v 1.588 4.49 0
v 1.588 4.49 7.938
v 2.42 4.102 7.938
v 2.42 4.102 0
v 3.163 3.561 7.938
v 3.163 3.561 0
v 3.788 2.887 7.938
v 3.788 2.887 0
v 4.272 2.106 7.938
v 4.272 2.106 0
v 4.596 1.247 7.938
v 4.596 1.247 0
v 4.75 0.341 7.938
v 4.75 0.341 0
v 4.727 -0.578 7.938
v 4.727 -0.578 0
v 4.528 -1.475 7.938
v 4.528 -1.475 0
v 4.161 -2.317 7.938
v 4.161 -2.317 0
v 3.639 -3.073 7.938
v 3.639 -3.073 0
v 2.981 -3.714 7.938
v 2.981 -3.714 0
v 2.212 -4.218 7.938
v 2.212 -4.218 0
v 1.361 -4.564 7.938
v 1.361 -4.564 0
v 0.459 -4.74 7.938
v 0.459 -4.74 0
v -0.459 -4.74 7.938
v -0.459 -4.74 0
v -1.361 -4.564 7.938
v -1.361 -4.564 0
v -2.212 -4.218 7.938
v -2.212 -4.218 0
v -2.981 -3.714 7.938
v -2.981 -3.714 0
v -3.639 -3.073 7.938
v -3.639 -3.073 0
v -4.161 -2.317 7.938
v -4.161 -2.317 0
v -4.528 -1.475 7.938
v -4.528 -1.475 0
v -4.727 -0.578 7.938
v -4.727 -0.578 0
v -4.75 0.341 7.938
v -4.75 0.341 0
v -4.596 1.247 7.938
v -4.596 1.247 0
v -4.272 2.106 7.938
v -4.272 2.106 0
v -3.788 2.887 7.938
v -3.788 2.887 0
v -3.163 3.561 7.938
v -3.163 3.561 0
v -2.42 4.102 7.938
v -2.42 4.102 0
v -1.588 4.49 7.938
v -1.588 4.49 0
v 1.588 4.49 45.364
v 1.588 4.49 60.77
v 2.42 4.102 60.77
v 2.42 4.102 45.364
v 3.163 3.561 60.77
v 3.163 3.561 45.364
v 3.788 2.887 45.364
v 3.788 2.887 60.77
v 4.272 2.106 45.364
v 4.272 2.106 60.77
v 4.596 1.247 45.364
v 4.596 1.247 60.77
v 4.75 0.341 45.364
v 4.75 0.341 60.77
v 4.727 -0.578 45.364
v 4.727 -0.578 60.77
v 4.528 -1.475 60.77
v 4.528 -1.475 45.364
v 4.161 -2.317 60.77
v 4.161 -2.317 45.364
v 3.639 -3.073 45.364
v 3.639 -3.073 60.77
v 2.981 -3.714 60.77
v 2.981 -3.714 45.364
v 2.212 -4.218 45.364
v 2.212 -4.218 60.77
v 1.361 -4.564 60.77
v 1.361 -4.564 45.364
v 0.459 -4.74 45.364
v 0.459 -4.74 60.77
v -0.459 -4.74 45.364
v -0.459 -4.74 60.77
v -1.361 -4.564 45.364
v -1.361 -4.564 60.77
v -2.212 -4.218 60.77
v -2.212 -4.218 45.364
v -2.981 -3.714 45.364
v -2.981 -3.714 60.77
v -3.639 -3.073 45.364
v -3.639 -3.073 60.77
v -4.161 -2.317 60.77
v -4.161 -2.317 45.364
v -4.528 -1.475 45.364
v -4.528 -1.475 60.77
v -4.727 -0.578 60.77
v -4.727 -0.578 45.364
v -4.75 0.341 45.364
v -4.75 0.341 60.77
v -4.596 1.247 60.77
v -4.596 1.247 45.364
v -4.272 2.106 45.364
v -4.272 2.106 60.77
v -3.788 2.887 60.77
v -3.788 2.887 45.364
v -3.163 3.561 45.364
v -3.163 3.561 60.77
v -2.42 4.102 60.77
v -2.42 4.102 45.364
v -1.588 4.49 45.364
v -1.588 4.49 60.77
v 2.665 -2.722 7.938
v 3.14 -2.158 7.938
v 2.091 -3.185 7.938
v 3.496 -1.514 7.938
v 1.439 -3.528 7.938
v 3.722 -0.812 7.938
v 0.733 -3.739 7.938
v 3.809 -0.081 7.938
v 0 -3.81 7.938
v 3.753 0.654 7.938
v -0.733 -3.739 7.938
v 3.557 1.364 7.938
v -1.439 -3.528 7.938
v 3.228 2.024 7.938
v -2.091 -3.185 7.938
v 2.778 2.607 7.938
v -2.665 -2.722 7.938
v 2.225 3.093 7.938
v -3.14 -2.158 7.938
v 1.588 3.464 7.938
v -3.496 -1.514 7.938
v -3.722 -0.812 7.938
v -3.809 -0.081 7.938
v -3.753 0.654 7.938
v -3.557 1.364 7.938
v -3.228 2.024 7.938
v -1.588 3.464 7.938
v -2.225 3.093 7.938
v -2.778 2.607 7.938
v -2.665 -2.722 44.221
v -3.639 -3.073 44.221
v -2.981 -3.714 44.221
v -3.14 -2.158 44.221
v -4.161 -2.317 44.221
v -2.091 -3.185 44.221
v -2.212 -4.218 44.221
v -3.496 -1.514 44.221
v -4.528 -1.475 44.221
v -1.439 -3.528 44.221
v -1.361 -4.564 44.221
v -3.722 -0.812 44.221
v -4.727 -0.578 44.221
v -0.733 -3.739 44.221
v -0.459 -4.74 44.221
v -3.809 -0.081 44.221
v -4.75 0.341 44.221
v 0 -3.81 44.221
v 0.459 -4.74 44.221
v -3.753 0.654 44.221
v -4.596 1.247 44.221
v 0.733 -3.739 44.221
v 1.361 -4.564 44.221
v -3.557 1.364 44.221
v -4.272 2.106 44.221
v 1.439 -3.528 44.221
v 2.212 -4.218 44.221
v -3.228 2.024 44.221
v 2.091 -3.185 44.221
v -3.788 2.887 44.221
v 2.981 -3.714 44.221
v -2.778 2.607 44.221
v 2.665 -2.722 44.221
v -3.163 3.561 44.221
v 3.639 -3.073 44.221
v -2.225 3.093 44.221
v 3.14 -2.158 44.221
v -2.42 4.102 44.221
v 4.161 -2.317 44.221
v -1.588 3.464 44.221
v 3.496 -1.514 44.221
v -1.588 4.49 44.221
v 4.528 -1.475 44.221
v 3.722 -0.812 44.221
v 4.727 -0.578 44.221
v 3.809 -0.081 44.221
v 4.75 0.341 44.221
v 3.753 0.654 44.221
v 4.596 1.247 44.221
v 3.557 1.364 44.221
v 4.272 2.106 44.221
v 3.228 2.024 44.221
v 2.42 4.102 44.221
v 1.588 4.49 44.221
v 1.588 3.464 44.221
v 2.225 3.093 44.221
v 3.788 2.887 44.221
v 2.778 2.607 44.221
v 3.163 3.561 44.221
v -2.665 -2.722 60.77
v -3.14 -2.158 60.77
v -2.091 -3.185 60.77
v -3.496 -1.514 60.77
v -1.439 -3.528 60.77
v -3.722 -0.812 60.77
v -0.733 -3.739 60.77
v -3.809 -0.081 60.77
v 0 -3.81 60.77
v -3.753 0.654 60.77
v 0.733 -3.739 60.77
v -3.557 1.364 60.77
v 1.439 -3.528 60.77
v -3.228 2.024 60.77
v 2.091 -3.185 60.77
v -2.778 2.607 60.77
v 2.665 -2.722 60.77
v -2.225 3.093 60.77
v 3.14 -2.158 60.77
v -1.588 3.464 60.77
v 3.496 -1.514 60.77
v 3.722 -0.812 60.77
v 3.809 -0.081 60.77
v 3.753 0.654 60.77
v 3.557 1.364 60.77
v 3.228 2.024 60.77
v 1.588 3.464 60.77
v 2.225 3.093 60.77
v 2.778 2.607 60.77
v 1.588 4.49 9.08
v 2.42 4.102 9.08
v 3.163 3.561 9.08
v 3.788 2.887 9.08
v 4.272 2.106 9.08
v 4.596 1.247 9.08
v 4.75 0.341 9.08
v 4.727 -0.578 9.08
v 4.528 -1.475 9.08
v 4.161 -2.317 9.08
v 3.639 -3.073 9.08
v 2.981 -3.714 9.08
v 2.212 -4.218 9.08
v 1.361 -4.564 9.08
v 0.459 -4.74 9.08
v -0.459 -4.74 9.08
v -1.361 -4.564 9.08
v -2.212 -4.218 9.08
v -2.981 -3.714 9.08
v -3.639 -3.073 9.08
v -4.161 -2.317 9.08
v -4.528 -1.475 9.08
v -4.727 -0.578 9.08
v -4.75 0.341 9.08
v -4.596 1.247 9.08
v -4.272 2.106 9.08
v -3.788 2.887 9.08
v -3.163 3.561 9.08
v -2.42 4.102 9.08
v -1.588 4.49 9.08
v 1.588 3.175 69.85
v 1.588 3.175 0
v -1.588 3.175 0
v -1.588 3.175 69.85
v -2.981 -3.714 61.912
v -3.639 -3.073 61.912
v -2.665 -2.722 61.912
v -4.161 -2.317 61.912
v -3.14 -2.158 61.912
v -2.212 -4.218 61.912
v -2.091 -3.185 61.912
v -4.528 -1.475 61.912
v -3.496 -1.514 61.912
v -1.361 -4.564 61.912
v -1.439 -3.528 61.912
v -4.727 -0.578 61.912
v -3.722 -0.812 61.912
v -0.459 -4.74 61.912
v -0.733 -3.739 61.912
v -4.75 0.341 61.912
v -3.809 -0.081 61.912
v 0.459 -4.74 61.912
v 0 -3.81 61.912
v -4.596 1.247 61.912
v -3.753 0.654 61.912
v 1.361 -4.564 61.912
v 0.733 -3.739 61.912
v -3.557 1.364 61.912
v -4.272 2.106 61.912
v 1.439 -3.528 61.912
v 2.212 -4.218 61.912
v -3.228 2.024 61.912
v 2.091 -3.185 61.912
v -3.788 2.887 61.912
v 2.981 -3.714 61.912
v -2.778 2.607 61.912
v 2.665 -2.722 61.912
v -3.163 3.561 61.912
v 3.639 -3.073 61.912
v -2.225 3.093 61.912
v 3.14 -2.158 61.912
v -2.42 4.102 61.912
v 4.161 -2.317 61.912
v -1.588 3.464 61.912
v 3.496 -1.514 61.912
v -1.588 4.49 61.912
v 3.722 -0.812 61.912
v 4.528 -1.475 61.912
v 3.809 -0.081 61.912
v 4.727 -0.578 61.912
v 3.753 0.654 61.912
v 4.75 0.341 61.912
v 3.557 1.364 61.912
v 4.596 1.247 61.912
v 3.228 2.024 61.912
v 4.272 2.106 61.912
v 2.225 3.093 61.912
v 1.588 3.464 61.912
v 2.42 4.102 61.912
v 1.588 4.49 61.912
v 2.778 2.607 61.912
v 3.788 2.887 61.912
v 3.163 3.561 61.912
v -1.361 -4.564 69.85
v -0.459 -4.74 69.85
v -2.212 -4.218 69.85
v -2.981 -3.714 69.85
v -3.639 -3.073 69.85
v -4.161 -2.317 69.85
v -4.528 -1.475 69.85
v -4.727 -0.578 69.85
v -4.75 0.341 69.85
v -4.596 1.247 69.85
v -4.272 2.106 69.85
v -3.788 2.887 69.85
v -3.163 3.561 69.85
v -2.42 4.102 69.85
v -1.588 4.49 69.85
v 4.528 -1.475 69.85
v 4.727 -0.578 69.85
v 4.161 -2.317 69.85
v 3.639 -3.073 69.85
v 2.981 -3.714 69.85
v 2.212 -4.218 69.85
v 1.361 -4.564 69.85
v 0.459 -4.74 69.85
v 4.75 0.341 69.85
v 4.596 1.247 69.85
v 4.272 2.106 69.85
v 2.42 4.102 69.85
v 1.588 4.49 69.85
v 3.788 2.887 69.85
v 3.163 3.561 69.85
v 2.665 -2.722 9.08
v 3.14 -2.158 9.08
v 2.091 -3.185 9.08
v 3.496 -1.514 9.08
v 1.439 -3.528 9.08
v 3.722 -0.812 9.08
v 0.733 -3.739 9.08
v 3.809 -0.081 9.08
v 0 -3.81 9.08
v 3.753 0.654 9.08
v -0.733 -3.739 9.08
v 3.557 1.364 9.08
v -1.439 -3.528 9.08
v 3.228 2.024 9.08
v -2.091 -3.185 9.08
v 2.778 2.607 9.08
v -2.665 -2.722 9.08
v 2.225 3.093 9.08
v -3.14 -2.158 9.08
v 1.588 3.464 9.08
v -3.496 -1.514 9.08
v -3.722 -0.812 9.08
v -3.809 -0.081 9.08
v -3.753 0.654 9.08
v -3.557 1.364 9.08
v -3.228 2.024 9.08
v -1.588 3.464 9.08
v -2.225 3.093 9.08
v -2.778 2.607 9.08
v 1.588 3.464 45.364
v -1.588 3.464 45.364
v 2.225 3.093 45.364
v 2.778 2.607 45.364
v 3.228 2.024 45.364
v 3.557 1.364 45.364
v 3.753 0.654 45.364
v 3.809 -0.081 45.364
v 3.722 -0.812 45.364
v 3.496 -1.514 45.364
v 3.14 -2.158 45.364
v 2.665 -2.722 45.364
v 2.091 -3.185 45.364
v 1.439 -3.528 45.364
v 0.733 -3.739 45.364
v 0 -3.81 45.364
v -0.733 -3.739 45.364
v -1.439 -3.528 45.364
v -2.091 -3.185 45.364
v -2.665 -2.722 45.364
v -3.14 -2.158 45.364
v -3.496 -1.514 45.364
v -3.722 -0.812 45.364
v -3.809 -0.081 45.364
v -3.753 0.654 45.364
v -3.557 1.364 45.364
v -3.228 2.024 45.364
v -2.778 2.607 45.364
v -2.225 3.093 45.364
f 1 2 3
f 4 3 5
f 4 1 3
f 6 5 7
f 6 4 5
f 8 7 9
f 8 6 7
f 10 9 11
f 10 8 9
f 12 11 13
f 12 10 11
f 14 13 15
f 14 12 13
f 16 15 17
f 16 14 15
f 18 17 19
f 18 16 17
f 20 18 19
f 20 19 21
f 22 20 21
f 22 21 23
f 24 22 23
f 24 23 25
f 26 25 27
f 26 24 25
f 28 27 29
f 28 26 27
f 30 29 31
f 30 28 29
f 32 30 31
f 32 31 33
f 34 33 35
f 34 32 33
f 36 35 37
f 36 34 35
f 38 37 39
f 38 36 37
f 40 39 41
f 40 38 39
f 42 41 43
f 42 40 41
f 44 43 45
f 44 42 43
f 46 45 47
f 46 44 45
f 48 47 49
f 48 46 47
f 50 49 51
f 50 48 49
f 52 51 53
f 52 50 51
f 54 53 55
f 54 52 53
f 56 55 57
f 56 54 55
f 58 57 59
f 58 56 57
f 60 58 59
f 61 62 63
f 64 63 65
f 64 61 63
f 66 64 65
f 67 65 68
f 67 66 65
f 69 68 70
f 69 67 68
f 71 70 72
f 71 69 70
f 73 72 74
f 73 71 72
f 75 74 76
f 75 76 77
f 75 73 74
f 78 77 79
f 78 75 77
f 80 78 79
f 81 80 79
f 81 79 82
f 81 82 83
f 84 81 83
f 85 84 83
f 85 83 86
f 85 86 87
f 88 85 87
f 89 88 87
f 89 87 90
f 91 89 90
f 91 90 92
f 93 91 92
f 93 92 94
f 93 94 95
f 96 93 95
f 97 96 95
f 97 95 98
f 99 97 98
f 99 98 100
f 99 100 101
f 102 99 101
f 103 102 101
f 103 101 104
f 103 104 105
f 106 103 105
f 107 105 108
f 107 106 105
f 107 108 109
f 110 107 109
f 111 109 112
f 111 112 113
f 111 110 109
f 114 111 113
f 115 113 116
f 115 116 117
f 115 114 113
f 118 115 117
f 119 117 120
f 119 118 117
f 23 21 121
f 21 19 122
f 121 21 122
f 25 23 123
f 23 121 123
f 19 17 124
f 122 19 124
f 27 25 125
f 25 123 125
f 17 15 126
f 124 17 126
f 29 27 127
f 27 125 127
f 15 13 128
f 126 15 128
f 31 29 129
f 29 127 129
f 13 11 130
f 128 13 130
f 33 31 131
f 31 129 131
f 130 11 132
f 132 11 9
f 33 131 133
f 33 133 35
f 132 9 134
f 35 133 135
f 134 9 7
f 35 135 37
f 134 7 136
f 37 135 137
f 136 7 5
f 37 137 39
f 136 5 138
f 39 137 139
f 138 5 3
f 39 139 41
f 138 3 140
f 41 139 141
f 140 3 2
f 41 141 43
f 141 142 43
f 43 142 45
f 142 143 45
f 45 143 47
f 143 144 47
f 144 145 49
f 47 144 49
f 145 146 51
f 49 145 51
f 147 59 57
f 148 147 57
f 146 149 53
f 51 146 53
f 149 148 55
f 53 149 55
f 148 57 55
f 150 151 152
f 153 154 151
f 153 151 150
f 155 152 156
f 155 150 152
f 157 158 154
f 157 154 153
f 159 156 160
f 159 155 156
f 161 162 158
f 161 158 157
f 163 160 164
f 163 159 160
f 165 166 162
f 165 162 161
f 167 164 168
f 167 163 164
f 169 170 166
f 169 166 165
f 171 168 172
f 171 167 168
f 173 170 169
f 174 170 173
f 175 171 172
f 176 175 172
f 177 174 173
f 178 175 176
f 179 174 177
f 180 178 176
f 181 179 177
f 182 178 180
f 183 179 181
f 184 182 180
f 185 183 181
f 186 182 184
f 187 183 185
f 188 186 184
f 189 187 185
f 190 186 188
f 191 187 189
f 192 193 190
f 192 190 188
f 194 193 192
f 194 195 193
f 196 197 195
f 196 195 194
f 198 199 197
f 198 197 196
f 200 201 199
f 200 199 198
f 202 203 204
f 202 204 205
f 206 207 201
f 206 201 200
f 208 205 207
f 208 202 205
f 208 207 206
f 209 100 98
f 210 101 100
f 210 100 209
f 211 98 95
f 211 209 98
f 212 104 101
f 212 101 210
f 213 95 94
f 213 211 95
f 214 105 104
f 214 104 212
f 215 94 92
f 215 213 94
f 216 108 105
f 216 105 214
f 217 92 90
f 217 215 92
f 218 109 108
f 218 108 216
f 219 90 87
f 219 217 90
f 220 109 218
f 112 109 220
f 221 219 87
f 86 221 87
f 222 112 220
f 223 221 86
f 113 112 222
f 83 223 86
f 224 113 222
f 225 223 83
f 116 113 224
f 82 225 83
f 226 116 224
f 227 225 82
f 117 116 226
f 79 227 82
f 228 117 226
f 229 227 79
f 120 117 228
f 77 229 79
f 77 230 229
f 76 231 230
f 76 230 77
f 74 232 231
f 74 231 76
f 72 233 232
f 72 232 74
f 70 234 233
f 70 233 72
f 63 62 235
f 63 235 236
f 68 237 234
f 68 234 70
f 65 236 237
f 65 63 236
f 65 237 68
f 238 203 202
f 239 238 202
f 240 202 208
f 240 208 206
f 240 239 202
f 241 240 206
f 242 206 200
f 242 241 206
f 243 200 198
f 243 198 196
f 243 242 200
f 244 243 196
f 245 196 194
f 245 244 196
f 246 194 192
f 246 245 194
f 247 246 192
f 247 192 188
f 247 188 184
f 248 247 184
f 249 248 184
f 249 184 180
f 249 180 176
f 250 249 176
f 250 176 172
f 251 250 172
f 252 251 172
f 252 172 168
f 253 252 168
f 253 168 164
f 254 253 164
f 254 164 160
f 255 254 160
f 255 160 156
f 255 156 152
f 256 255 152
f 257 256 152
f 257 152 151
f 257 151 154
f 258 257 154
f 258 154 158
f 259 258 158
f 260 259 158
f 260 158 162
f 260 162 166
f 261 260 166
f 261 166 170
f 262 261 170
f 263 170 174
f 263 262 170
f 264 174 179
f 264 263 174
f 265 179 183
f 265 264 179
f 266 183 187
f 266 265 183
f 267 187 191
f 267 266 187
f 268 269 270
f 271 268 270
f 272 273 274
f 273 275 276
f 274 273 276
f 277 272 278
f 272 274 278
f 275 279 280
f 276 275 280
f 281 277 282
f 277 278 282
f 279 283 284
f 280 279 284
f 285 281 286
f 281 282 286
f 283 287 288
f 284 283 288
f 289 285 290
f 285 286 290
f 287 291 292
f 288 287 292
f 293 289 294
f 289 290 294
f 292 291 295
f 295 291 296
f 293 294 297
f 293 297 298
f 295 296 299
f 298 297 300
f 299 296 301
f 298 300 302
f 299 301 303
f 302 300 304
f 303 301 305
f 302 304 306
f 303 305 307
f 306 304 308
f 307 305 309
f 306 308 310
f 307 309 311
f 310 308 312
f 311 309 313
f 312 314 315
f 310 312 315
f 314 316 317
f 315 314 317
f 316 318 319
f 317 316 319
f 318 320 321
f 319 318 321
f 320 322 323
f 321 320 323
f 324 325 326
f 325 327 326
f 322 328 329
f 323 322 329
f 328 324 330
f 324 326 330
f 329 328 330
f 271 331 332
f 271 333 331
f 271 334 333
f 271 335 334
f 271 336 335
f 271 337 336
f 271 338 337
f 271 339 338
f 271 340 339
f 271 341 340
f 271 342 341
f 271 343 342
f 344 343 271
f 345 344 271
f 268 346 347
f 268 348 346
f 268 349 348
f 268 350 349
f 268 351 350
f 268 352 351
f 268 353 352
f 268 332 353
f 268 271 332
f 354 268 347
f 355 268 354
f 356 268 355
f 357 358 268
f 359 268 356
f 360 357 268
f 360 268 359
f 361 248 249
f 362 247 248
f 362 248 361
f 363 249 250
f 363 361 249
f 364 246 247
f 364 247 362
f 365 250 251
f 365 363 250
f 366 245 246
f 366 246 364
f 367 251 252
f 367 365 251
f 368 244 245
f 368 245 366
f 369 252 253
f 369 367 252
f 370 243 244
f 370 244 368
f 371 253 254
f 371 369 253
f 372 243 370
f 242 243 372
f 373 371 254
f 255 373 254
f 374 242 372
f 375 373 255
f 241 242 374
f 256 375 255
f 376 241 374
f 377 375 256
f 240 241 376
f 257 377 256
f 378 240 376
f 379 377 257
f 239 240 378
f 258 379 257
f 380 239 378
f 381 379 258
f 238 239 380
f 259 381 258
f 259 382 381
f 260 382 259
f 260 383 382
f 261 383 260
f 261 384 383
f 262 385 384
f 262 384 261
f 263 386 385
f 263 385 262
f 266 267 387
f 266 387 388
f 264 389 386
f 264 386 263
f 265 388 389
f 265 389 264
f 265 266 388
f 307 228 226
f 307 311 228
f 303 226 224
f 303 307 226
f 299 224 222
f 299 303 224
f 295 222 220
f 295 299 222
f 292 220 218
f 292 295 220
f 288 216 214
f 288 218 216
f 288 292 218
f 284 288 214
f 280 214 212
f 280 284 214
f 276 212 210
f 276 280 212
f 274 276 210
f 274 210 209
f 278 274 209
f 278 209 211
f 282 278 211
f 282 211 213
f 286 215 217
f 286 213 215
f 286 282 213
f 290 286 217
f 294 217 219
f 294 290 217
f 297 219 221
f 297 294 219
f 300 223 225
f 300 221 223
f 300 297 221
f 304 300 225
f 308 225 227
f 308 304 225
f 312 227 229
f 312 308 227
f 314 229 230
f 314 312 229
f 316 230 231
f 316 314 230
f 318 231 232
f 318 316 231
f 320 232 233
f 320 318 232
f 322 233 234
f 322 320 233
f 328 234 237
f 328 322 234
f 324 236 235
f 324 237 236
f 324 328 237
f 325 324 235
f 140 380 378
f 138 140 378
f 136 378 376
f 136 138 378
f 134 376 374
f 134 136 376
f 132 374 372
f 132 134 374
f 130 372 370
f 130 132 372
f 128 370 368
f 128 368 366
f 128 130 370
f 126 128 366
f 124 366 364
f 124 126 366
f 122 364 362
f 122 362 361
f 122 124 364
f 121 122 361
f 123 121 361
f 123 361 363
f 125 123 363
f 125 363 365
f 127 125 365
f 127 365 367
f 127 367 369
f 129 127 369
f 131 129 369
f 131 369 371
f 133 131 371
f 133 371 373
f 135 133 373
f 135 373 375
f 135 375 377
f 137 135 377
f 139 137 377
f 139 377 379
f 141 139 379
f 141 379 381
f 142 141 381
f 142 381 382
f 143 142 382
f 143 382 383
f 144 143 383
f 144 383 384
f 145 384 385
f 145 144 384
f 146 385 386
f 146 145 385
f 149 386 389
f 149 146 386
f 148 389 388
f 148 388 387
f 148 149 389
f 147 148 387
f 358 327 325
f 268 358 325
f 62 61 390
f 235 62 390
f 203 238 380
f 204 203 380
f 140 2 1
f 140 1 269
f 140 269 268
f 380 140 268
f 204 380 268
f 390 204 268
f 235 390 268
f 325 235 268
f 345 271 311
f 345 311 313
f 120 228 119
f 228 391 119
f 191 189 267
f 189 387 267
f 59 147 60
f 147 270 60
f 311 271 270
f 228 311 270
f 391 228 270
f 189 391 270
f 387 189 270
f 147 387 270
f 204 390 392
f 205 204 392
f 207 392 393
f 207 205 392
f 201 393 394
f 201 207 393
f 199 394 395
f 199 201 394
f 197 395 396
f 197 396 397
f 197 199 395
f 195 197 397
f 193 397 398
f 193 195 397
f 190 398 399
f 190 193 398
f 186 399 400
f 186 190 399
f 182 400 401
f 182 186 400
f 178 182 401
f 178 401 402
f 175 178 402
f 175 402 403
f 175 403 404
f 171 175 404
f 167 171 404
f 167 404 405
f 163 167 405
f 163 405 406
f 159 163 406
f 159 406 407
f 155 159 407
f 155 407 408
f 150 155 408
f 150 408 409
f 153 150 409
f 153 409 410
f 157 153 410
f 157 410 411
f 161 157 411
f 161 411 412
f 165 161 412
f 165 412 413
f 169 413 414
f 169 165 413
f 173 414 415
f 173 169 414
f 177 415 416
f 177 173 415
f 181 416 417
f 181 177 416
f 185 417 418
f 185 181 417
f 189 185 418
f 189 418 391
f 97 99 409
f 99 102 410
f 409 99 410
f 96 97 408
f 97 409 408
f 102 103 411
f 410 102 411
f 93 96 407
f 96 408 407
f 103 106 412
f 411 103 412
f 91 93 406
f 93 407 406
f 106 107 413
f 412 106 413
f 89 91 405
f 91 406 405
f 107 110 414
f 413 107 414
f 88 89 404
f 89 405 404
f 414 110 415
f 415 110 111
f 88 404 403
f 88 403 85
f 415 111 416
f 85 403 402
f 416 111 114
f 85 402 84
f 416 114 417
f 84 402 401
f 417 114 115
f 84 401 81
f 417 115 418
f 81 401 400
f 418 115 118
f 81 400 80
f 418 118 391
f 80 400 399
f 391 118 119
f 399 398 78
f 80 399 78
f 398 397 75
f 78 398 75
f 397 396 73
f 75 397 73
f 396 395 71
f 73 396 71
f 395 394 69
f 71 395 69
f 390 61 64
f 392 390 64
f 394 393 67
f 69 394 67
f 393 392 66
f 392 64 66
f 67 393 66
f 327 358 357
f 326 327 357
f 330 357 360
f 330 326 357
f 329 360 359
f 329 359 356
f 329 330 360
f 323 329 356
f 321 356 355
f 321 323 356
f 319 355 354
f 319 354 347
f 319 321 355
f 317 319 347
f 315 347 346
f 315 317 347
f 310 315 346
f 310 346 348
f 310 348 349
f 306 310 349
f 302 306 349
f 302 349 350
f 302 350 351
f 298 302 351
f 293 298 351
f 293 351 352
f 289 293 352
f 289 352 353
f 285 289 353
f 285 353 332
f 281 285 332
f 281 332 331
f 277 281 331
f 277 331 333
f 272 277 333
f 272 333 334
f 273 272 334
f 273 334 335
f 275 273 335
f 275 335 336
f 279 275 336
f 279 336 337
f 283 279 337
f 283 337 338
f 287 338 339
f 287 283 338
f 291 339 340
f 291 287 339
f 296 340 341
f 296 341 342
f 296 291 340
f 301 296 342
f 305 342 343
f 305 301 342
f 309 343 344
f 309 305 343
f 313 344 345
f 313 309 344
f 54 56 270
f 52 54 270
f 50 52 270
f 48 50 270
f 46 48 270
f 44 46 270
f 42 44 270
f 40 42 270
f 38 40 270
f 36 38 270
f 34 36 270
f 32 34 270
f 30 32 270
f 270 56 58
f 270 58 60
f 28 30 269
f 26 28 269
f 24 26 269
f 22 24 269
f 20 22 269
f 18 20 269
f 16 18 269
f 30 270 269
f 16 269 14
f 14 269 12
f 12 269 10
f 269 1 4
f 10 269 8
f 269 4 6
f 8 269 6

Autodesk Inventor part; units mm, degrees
sketch "Sketch1" plane through (0, 0, 0) normal (0, 0, 1) x (1, 0, 0)
  circle A0 centre (0, 0) radius 4.7625
  line L0 (-1.5875, 6.35) -> (1.5875, 6.35)
  line L1 (1.5875, 6.35) -> (1.5875, 3.175)
  line L2 (1.5875, 3.175) -> (-1.5875, 3.175)
  line L3 (-1.5875, 3.175) -> (-1.5875, 6.35)
  dimension "d0" = 9.525
  dimension "d16" = 3.175
  dimension "d17" = 3.175
  dimension "d18" = 1.5875
  dimension "d19" = 6.35
extrude "Extrusion1" add sketch "Sketch1" along normal blind 69.85 contours A0 L3 L2 L1 | L1 L2 L3 A0
ref_plane "Work Plane1" through (0, 0, 61.9125) normal (0, 0, 1) x (1, 0, 0)
sketch "Sketch2" plane through (0, 0, 61.9125) normal (0, 0, 1) x (1, 0, 0)
  circle A0 centre (0, 0) radius 3.81
  circle A1 centre (0, 0) radius 4.7625 projected
  dimension "d4" = 7.62
extrude "Extrusion2" cut sketch "Sketch2" against normal blind 1.143
ref_plane "Work Plane2" through (0, 0, 7.9375) normal (0, 0, -1) x (-1, 0, 0)
sketch "Sketch3" plane through (0, 0, 7.9375) normal (0, 0, -1) x (-1, 0, 0)
  circle A0 centre (0, 0) radius 3.81 projected
  circle A1 centre (0, 0) radius 4.7625 projected
extrude "Extrusion3" cut sketch "Sketch3" against normal blind 1.143
ref_plane "Work Plane3" through (0, 0, 44.2214) normal (0, 0, 1) x (1, 0, 0)
sketch "Sketch4" plane through (0, 0, 44.2214) normal (0, 0, 1) x (1, 0, 0)
  circle A0 centre (0, 0) radius 3.81 projected
  circle A1 centre (0, 0) radius 4.7625 projected
extrude "Extrusion4" cut sketch "Sketch4" along normal blind 1.143
ref_plane "Work Plane4" through (0, 0, 68.1736) normal (0, 0, 1) x (1, 0, 0)
extrude "Extrusion6" cut sketch "Sketch1" along normal through all contours L1 L2 L3 A0 | A0 L3 L0 L1 picked at (-0.1794, 3.694)
equation "\"d17\" = d16"
equation "\"d18\" = 0.5 * d16"
properties part number "lower box upper shaft"
